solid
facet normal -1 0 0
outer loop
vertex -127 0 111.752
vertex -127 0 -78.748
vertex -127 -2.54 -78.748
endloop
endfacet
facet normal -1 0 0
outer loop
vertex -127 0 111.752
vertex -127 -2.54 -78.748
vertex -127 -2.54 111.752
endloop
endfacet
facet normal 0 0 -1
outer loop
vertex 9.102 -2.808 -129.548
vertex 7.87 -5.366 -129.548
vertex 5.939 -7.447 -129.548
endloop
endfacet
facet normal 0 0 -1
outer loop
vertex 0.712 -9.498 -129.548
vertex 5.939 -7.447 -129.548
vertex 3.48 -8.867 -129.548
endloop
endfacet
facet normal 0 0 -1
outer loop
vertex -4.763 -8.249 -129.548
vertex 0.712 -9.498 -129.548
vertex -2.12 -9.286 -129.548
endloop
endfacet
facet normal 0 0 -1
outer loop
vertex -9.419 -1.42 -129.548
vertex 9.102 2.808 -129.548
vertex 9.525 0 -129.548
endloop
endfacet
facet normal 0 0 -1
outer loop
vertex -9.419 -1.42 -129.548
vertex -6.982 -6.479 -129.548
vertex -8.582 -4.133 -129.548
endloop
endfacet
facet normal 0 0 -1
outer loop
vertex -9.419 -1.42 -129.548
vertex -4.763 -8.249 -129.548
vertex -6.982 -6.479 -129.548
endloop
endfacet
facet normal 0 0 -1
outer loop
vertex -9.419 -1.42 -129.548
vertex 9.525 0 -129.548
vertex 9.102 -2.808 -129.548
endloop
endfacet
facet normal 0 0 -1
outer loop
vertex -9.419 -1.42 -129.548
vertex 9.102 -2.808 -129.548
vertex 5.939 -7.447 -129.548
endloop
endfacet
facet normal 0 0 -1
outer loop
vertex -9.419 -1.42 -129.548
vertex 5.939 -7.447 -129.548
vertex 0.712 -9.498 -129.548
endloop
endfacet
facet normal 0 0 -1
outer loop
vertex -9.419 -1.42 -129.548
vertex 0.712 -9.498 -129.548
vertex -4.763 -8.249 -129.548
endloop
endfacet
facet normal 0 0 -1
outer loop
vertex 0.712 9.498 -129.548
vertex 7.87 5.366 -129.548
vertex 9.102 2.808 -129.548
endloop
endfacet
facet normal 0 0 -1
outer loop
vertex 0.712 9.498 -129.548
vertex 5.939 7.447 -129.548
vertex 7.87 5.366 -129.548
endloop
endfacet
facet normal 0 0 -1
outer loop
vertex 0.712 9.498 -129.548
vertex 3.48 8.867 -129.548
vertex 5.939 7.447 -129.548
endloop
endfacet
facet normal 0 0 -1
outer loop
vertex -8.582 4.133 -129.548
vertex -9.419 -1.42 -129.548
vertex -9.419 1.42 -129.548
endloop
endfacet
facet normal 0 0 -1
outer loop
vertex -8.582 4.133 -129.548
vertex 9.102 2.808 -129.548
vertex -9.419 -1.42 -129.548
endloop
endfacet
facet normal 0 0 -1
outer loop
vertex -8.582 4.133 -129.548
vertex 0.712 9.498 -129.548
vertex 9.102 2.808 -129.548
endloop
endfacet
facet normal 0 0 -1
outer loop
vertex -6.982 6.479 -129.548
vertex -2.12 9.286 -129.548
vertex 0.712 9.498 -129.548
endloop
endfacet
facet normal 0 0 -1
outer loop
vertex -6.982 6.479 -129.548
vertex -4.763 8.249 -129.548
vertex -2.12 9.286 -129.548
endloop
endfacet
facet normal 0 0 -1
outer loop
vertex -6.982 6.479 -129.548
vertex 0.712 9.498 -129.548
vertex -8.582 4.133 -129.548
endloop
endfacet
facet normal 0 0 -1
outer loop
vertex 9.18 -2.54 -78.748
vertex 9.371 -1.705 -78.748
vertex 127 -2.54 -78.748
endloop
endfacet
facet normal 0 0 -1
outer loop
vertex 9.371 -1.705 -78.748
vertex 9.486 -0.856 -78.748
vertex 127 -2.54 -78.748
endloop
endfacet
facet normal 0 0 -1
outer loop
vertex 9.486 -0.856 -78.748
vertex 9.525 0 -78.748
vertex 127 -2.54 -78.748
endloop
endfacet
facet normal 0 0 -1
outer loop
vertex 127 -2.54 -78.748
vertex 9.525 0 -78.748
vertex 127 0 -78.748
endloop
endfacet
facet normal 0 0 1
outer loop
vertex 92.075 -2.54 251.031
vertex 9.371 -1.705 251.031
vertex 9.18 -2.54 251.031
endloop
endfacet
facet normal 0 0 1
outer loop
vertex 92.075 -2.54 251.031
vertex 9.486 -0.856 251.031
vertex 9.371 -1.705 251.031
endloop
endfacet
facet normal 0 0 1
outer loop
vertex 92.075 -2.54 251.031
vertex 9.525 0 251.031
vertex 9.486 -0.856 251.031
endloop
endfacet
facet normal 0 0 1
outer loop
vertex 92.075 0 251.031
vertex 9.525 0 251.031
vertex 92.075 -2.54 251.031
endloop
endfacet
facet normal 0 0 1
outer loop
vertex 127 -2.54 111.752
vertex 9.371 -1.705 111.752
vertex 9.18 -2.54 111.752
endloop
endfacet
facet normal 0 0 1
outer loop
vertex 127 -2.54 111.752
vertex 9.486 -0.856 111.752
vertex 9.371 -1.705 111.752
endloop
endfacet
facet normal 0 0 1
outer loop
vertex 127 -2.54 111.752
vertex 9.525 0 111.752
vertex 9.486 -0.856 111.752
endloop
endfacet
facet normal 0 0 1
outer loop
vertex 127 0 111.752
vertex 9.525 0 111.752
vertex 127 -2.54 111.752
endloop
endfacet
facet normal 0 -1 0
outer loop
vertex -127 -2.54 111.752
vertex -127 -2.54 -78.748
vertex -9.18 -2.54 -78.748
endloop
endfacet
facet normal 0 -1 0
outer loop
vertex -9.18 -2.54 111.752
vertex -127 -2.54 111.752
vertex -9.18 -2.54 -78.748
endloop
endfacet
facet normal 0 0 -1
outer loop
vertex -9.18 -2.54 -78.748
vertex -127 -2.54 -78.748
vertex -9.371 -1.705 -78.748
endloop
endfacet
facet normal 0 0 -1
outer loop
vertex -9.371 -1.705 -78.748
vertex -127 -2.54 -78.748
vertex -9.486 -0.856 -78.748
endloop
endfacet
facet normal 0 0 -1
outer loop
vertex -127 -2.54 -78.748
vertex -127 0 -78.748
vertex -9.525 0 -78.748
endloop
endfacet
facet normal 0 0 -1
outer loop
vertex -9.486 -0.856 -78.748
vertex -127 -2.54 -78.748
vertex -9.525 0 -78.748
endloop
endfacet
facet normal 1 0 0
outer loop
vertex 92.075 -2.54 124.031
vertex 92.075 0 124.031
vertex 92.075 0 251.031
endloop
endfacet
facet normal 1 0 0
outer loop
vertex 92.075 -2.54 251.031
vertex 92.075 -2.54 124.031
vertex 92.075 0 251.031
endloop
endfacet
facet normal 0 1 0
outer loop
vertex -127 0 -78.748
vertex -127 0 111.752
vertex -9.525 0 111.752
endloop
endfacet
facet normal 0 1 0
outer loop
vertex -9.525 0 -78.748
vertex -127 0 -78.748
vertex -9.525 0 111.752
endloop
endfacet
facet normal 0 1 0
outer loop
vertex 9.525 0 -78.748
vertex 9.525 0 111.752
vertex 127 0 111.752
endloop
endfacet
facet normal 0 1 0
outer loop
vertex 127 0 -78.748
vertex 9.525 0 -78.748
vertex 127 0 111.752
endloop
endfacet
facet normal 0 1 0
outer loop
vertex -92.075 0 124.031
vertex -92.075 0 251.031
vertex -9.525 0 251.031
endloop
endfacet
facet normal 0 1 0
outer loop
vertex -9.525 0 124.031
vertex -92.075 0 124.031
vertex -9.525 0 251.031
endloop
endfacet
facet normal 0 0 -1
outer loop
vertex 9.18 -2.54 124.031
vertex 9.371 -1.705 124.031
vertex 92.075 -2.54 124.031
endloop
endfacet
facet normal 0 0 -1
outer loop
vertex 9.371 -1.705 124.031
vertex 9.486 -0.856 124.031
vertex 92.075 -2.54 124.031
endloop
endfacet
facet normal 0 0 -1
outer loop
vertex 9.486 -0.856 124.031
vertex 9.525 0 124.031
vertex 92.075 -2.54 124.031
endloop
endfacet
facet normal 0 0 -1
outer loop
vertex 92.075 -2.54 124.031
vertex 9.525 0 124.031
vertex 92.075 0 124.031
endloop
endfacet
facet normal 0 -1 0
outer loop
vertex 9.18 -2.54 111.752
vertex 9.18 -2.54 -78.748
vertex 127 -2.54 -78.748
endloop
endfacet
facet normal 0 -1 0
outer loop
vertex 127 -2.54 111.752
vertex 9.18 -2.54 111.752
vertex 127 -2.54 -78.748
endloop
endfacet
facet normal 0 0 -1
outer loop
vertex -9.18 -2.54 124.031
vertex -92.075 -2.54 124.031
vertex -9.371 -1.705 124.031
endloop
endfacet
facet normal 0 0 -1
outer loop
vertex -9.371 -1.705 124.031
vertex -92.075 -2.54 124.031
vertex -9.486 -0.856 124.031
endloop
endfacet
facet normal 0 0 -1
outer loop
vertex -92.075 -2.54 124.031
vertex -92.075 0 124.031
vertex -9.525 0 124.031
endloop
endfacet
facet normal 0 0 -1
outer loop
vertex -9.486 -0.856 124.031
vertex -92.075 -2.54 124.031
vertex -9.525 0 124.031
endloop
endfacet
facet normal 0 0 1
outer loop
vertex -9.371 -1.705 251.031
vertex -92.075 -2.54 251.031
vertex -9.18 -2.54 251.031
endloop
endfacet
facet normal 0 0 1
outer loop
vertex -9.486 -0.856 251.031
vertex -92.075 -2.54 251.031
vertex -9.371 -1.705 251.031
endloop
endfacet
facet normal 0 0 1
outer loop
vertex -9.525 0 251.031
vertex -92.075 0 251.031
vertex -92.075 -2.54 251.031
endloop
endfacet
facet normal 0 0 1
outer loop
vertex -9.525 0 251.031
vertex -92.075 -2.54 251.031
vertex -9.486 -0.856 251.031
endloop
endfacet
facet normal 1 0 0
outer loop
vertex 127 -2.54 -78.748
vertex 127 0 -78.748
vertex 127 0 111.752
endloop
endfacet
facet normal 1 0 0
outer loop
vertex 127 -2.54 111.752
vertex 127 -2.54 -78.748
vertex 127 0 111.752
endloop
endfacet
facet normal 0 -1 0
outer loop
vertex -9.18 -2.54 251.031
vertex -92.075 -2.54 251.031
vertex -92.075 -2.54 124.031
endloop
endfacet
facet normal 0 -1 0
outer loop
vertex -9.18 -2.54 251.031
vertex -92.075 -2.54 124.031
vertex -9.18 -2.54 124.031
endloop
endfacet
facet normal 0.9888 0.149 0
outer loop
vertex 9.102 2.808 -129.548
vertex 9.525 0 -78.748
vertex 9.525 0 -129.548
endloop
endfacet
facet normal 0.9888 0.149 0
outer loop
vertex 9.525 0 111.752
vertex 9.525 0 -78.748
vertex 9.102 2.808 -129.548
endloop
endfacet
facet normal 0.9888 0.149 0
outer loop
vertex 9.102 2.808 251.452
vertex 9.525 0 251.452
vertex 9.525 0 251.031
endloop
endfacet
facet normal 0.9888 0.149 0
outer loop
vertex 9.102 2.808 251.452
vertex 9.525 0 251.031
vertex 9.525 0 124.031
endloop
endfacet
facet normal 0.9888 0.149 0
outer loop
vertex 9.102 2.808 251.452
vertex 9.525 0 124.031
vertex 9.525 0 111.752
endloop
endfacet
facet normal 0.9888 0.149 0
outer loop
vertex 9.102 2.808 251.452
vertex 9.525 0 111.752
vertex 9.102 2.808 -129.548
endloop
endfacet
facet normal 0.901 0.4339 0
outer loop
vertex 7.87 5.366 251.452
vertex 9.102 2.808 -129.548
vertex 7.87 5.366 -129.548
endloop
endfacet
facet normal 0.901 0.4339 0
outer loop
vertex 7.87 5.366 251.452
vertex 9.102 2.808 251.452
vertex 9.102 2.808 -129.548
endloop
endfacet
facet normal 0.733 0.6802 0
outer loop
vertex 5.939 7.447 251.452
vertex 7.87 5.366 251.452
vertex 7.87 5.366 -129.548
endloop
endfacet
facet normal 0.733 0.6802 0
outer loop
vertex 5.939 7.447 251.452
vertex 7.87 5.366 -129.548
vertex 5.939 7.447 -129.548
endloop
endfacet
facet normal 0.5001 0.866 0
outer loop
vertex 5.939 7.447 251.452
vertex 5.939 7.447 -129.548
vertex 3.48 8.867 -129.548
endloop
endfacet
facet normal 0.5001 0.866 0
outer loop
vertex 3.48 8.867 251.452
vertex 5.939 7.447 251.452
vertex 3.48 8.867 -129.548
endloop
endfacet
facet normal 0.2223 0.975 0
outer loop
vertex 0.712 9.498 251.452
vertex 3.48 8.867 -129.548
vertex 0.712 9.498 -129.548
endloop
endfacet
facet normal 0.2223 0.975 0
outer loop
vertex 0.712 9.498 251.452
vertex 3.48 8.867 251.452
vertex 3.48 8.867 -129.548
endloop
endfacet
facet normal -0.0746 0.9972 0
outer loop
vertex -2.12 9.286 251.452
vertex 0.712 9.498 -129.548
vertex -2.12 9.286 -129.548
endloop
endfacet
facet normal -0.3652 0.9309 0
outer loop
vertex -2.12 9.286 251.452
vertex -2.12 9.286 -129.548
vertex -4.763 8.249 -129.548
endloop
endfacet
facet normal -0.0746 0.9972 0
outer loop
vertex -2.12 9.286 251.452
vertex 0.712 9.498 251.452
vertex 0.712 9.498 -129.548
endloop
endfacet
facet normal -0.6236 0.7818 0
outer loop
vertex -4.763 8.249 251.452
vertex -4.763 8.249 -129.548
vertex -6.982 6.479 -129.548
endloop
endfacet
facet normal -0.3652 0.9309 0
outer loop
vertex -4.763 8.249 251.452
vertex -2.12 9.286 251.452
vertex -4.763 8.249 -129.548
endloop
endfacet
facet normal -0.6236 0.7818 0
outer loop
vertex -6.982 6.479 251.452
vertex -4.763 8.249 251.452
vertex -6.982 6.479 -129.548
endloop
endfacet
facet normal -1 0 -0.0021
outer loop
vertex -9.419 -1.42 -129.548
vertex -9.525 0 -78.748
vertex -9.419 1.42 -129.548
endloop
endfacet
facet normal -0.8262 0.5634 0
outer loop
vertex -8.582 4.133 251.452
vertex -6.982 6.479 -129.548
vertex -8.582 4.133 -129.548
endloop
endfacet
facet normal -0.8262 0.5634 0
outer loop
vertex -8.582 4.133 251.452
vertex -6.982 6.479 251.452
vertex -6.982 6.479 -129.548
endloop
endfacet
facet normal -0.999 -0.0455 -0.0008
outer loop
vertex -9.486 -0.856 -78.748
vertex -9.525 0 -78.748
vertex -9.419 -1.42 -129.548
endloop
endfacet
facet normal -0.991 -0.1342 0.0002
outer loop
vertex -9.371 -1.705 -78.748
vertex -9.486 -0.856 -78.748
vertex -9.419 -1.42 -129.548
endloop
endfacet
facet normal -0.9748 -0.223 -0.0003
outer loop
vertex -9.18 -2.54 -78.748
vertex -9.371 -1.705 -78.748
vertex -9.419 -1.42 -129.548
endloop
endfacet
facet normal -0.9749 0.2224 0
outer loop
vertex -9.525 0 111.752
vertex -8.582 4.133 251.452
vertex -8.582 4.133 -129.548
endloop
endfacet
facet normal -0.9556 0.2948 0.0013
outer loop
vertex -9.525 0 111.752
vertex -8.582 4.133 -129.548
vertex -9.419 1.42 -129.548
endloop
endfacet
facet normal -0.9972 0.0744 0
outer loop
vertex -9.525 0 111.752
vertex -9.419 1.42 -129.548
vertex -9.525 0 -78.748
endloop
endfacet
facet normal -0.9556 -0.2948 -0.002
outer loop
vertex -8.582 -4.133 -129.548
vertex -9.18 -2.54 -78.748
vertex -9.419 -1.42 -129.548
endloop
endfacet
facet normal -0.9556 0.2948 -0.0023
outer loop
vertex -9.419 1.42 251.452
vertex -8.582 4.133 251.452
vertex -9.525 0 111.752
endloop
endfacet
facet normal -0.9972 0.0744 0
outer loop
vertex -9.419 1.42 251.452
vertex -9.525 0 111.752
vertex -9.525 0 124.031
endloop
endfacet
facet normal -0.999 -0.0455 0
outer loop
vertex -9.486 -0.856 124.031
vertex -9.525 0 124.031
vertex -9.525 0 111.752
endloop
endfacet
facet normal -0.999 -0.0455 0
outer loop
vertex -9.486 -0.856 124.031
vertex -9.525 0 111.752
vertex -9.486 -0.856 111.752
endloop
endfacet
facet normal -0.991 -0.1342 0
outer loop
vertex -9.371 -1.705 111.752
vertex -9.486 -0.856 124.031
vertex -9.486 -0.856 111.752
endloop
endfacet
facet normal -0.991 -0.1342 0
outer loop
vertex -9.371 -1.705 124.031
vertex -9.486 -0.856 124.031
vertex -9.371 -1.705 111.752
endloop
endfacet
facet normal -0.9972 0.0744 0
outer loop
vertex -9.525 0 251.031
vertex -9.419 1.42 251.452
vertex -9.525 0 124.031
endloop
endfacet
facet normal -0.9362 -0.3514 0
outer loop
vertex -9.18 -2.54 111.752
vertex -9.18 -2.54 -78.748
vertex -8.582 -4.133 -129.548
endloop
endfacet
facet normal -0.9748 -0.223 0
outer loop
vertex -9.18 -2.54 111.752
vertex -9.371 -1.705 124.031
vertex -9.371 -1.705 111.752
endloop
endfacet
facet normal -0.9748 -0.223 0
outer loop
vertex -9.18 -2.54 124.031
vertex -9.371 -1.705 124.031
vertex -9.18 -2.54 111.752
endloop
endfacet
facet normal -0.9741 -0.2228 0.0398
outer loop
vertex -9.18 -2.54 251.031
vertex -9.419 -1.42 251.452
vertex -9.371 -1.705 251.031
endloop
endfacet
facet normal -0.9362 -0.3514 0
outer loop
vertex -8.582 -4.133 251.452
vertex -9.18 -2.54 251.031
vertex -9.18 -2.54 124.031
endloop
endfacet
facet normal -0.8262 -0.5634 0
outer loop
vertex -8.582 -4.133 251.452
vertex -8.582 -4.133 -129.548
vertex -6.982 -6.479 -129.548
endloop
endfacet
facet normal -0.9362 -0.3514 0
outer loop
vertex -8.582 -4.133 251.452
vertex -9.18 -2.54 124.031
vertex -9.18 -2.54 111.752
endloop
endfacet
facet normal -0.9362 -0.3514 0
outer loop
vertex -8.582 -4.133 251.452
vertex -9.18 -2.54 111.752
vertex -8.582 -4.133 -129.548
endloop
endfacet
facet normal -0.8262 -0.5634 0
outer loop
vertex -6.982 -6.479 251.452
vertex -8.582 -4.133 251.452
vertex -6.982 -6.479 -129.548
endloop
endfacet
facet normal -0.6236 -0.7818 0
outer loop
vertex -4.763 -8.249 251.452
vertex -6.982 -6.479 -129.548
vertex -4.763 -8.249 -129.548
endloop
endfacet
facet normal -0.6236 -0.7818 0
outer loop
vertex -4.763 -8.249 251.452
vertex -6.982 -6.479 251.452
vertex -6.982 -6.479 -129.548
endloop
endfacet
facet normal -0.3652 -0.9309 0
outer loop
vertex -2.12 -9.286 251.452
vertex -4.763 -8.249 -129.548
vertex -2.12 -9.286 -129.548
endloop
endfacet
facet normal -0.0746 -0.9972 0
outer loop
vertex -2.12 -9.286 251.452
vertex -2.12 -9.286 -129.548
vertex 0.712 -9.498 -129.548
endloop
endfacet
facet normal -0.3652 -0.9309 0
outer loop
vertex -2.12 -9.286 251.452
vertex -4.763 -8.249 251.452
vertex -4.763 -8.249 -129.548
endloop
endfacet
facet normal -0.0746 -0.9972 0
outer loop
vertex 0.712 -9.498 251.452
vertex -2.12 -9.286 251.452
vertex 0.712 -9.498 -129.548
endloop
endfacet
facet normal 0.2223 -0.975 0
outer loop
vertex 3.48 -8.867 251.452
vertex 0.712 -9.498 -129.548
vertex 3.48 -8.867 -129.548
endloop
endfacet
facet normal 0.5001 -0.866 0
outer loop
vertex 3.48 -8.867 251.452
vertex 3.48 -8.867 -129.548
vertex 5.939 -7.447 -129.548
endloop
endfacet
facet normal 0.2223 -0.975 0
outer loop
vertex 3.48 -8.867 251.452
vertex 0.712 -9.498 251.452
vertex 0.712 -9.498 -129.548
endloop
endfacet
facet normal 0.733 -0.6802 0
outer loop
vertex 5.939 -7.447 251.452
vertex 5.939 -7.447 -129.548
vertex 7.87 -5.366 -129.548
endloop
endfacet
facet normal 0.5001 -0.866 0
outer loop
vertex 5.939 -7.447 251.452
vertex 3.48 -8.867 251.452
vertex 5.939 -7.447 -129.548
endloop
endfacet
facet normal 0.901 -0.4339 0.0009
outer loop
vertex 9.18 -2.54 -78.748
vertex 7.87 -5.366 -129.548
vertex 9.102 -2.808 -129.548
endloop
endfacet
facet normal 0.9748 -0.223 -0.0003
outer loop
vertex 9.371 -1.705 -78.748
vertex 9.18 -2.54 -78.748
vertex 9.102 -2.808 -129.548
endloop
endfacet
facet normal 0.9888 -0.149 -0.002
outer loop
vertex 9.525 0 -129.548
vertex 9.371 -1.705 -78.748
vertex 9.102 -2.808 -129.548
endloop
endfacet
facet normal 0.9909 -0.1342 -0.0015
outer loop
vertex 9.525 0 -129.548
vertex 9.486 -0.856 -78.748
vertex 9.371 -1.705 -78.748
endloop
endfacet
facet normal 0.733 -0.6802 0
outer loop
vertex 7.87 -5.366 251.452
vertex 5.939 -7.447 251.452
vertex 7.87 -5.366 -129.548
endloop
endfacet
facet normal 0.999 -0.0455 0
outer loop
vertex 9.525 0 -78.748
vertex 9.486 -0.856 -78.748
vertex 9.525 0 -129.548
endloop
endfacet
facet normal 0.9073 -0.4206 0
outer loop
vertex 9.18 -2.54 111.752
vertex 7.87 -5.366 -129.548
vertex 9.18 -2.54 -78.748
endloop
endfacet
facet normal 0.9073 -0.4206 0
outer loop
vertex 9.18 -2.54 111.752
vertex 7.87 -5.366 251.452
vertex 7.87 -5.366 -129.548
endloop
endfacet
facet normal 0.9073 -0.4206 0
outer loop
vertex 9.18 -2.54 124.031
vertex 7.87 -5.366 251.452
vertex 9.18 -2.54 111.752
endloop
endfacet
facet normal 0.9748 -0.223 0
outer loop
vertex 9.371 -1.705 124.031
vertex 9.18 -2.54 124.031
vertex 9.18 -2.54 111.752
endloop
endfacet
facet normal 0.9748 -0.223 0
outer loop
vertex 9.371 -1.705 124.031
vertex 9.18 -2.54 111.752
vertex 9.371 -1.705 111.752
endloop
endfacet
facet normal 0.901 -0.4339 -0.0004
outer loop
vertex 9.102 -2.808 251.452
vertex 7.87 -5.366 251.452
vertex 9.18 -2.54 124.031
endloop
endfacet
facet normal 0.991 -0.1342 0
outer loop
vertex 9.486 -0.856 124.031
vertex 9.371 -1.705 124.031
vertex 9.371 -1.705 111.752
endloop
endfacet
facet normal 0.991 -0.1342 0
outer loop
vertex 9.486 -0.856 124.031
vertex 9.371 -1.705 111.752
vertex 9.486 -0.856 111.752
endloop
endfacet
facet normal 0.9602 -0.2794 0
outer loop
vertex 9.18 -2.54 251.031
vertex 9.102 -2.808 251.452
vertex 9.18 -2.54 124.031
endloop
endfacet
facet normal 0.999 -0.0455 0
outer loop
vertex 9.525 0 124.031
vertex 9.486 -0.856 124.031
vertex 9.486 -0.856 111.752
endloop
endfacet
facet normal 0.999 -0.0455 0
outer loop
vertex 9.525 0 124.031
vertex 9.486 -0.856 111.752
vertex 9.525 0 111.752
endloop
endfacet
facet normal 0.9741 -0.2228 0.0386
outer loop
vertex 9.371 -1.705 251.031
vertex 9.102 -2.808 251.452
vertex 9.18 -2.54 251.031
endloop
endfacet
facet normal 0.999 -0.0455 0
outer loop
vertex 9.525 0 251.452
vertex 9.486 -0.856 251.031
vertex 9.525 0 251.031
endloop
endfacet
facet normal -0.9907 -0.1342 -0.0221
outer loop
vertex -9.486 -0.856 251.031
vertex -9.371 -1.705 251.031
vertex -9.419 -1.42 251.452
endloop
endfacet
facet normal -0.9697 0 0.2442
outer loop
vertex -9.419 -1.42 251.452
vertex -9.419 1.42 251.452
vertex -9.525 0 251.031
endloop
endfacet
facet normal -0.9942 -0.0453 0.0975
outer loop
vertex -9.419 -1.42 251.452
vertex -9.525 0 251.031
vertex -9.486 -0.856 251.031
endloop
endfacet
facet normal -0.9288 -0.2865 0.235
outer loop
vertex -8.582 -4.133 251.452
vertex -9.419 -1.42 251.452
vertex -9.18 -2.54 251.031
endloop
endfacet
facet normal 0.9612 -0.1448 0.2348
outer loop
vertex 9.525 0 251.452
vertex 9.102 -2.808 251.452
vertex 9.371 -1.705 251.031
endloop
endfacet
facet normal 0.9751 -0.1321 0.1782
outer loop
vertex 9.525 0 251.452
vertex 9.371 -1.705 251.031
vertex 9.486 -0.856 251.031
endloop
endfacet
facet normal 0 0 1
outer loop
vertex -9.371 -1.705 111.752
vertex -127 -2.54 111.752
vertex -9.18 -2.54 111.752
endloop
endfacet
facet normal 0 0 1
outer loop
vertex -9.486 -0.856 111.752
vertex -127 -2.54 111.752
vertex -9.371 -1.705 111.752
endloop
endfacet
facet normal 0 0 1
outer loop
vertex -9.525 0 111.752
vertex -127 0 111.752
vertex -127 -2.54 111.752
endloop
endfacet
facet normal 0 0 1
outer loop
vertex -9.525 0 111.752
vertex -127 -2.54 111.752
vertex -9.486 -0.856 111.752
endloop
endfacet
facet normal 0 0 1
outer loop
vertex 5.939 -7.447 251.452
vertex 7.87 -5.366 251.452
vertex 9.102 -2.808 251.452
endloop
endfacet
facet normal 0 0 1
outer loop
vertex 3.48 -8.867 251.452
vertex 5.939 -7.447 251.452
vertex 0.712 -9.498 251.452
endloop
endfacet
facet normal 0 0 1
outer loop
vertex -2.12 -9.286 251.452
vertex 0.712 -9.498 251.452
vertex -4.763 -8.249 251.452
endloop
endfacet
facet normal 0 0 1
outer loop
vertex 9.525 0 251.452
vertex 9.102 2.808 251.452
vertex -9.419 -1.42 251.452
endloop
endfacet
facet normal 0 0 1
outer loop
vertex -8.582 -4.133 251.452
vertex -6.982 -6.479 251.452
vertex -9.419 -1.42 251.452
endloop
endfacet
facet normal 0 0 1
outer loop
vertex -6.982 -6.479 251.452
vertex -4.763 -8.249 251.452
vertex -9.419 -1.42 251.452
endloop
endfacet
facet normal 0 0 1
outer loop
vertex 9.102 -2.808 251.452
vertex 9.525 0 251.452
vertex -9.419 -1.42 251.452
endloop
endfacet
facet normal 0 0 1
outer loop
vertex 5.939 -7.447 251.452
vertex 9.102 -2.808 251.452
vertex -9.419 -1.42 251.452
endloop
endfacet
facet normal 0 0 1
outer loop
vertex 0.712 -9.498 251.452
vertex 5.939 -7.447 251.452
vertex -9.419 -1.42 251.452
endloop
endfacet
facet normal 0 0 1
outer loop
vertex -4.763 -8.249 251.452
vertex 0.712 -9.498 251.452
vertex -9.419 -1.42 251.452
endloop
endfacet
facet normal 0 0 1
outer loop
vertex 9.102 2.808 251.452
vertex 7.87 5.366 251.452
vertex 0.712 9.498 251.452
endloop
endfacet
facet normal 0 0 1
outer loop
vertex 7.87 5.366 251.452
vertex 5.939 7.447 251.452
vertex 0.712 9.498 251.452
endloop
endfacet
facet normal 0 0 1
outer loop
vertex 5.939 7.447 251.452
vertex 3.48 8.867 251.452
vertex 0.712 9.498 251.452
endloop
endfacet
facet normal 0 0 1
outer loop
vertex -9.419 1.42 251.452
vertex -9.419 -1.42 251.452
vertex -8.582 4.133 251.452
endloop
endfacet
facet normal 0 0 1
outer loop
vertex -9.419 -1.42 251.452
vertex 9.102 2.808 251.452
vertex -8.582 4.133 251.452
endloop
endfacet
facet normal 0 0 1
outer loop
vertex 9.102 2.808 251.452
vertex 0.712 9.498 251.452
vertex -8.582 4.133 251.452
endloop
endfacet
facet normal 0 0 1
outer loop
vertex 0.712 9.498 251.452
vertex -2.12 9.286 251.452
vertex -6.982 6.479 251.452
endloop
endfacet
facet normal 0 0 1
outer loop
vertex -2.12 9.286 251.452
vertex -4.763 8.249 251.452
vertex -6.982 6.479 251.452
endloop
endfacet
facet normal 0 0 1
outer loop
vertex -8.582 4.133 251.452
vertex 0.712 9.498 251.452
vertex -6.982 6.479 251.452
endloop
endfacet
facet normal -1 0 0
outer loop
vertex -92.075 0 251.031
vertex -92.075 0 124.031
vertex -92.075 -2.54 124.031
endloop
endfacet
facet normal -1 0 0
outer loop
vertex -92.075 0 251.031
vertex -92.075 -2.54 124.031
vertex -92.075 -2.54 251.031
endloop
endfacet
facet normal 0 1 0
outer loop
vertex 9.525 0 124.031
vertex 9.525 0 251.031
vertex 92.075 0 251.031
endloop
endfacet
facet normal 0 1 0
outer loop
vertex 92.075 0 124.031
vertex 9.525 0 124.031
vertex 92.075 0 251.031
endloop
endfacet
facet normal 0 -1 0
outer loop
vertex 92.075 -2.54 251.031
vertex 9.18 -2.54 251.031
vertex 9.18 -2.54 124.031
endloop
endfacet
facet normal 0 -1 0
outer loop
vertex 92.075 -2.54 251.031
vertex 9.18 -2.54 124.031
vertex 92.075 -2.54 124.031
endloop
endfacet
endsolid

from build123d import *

# Parameters (mm, degrees)
F0_W     = 9.525
F0_H     = 381
F2_W     = 184.15
F2_H     = 127
F2_W_2   = 254
F2_H_2   = 190.5
F3_DEPTH = 2.54


with BuildPart() as f1:
    # F0 (on Front) → F1 (revolve)
    with BuildSketch(Plane.XZ):
        with Locations((4.7625, 60.951888)):
            Rectangle(F0_W, F0_H)
    revolve(axis=Axis((0, 0, 60.951888), (0, 0, 1)))

    # F2 (on Front) → F3 (join)
    with BuildSketch(Plane.XZ):
        with Locations((0, 187.531114)):
            Rectangle(F2_W, F2_H)
        with Locations((0, 16.501888)):
            Rectangle(F2_W_2, F2_H_2)
    extrude(amount=F3_DEPTH)


solid = f1.part
